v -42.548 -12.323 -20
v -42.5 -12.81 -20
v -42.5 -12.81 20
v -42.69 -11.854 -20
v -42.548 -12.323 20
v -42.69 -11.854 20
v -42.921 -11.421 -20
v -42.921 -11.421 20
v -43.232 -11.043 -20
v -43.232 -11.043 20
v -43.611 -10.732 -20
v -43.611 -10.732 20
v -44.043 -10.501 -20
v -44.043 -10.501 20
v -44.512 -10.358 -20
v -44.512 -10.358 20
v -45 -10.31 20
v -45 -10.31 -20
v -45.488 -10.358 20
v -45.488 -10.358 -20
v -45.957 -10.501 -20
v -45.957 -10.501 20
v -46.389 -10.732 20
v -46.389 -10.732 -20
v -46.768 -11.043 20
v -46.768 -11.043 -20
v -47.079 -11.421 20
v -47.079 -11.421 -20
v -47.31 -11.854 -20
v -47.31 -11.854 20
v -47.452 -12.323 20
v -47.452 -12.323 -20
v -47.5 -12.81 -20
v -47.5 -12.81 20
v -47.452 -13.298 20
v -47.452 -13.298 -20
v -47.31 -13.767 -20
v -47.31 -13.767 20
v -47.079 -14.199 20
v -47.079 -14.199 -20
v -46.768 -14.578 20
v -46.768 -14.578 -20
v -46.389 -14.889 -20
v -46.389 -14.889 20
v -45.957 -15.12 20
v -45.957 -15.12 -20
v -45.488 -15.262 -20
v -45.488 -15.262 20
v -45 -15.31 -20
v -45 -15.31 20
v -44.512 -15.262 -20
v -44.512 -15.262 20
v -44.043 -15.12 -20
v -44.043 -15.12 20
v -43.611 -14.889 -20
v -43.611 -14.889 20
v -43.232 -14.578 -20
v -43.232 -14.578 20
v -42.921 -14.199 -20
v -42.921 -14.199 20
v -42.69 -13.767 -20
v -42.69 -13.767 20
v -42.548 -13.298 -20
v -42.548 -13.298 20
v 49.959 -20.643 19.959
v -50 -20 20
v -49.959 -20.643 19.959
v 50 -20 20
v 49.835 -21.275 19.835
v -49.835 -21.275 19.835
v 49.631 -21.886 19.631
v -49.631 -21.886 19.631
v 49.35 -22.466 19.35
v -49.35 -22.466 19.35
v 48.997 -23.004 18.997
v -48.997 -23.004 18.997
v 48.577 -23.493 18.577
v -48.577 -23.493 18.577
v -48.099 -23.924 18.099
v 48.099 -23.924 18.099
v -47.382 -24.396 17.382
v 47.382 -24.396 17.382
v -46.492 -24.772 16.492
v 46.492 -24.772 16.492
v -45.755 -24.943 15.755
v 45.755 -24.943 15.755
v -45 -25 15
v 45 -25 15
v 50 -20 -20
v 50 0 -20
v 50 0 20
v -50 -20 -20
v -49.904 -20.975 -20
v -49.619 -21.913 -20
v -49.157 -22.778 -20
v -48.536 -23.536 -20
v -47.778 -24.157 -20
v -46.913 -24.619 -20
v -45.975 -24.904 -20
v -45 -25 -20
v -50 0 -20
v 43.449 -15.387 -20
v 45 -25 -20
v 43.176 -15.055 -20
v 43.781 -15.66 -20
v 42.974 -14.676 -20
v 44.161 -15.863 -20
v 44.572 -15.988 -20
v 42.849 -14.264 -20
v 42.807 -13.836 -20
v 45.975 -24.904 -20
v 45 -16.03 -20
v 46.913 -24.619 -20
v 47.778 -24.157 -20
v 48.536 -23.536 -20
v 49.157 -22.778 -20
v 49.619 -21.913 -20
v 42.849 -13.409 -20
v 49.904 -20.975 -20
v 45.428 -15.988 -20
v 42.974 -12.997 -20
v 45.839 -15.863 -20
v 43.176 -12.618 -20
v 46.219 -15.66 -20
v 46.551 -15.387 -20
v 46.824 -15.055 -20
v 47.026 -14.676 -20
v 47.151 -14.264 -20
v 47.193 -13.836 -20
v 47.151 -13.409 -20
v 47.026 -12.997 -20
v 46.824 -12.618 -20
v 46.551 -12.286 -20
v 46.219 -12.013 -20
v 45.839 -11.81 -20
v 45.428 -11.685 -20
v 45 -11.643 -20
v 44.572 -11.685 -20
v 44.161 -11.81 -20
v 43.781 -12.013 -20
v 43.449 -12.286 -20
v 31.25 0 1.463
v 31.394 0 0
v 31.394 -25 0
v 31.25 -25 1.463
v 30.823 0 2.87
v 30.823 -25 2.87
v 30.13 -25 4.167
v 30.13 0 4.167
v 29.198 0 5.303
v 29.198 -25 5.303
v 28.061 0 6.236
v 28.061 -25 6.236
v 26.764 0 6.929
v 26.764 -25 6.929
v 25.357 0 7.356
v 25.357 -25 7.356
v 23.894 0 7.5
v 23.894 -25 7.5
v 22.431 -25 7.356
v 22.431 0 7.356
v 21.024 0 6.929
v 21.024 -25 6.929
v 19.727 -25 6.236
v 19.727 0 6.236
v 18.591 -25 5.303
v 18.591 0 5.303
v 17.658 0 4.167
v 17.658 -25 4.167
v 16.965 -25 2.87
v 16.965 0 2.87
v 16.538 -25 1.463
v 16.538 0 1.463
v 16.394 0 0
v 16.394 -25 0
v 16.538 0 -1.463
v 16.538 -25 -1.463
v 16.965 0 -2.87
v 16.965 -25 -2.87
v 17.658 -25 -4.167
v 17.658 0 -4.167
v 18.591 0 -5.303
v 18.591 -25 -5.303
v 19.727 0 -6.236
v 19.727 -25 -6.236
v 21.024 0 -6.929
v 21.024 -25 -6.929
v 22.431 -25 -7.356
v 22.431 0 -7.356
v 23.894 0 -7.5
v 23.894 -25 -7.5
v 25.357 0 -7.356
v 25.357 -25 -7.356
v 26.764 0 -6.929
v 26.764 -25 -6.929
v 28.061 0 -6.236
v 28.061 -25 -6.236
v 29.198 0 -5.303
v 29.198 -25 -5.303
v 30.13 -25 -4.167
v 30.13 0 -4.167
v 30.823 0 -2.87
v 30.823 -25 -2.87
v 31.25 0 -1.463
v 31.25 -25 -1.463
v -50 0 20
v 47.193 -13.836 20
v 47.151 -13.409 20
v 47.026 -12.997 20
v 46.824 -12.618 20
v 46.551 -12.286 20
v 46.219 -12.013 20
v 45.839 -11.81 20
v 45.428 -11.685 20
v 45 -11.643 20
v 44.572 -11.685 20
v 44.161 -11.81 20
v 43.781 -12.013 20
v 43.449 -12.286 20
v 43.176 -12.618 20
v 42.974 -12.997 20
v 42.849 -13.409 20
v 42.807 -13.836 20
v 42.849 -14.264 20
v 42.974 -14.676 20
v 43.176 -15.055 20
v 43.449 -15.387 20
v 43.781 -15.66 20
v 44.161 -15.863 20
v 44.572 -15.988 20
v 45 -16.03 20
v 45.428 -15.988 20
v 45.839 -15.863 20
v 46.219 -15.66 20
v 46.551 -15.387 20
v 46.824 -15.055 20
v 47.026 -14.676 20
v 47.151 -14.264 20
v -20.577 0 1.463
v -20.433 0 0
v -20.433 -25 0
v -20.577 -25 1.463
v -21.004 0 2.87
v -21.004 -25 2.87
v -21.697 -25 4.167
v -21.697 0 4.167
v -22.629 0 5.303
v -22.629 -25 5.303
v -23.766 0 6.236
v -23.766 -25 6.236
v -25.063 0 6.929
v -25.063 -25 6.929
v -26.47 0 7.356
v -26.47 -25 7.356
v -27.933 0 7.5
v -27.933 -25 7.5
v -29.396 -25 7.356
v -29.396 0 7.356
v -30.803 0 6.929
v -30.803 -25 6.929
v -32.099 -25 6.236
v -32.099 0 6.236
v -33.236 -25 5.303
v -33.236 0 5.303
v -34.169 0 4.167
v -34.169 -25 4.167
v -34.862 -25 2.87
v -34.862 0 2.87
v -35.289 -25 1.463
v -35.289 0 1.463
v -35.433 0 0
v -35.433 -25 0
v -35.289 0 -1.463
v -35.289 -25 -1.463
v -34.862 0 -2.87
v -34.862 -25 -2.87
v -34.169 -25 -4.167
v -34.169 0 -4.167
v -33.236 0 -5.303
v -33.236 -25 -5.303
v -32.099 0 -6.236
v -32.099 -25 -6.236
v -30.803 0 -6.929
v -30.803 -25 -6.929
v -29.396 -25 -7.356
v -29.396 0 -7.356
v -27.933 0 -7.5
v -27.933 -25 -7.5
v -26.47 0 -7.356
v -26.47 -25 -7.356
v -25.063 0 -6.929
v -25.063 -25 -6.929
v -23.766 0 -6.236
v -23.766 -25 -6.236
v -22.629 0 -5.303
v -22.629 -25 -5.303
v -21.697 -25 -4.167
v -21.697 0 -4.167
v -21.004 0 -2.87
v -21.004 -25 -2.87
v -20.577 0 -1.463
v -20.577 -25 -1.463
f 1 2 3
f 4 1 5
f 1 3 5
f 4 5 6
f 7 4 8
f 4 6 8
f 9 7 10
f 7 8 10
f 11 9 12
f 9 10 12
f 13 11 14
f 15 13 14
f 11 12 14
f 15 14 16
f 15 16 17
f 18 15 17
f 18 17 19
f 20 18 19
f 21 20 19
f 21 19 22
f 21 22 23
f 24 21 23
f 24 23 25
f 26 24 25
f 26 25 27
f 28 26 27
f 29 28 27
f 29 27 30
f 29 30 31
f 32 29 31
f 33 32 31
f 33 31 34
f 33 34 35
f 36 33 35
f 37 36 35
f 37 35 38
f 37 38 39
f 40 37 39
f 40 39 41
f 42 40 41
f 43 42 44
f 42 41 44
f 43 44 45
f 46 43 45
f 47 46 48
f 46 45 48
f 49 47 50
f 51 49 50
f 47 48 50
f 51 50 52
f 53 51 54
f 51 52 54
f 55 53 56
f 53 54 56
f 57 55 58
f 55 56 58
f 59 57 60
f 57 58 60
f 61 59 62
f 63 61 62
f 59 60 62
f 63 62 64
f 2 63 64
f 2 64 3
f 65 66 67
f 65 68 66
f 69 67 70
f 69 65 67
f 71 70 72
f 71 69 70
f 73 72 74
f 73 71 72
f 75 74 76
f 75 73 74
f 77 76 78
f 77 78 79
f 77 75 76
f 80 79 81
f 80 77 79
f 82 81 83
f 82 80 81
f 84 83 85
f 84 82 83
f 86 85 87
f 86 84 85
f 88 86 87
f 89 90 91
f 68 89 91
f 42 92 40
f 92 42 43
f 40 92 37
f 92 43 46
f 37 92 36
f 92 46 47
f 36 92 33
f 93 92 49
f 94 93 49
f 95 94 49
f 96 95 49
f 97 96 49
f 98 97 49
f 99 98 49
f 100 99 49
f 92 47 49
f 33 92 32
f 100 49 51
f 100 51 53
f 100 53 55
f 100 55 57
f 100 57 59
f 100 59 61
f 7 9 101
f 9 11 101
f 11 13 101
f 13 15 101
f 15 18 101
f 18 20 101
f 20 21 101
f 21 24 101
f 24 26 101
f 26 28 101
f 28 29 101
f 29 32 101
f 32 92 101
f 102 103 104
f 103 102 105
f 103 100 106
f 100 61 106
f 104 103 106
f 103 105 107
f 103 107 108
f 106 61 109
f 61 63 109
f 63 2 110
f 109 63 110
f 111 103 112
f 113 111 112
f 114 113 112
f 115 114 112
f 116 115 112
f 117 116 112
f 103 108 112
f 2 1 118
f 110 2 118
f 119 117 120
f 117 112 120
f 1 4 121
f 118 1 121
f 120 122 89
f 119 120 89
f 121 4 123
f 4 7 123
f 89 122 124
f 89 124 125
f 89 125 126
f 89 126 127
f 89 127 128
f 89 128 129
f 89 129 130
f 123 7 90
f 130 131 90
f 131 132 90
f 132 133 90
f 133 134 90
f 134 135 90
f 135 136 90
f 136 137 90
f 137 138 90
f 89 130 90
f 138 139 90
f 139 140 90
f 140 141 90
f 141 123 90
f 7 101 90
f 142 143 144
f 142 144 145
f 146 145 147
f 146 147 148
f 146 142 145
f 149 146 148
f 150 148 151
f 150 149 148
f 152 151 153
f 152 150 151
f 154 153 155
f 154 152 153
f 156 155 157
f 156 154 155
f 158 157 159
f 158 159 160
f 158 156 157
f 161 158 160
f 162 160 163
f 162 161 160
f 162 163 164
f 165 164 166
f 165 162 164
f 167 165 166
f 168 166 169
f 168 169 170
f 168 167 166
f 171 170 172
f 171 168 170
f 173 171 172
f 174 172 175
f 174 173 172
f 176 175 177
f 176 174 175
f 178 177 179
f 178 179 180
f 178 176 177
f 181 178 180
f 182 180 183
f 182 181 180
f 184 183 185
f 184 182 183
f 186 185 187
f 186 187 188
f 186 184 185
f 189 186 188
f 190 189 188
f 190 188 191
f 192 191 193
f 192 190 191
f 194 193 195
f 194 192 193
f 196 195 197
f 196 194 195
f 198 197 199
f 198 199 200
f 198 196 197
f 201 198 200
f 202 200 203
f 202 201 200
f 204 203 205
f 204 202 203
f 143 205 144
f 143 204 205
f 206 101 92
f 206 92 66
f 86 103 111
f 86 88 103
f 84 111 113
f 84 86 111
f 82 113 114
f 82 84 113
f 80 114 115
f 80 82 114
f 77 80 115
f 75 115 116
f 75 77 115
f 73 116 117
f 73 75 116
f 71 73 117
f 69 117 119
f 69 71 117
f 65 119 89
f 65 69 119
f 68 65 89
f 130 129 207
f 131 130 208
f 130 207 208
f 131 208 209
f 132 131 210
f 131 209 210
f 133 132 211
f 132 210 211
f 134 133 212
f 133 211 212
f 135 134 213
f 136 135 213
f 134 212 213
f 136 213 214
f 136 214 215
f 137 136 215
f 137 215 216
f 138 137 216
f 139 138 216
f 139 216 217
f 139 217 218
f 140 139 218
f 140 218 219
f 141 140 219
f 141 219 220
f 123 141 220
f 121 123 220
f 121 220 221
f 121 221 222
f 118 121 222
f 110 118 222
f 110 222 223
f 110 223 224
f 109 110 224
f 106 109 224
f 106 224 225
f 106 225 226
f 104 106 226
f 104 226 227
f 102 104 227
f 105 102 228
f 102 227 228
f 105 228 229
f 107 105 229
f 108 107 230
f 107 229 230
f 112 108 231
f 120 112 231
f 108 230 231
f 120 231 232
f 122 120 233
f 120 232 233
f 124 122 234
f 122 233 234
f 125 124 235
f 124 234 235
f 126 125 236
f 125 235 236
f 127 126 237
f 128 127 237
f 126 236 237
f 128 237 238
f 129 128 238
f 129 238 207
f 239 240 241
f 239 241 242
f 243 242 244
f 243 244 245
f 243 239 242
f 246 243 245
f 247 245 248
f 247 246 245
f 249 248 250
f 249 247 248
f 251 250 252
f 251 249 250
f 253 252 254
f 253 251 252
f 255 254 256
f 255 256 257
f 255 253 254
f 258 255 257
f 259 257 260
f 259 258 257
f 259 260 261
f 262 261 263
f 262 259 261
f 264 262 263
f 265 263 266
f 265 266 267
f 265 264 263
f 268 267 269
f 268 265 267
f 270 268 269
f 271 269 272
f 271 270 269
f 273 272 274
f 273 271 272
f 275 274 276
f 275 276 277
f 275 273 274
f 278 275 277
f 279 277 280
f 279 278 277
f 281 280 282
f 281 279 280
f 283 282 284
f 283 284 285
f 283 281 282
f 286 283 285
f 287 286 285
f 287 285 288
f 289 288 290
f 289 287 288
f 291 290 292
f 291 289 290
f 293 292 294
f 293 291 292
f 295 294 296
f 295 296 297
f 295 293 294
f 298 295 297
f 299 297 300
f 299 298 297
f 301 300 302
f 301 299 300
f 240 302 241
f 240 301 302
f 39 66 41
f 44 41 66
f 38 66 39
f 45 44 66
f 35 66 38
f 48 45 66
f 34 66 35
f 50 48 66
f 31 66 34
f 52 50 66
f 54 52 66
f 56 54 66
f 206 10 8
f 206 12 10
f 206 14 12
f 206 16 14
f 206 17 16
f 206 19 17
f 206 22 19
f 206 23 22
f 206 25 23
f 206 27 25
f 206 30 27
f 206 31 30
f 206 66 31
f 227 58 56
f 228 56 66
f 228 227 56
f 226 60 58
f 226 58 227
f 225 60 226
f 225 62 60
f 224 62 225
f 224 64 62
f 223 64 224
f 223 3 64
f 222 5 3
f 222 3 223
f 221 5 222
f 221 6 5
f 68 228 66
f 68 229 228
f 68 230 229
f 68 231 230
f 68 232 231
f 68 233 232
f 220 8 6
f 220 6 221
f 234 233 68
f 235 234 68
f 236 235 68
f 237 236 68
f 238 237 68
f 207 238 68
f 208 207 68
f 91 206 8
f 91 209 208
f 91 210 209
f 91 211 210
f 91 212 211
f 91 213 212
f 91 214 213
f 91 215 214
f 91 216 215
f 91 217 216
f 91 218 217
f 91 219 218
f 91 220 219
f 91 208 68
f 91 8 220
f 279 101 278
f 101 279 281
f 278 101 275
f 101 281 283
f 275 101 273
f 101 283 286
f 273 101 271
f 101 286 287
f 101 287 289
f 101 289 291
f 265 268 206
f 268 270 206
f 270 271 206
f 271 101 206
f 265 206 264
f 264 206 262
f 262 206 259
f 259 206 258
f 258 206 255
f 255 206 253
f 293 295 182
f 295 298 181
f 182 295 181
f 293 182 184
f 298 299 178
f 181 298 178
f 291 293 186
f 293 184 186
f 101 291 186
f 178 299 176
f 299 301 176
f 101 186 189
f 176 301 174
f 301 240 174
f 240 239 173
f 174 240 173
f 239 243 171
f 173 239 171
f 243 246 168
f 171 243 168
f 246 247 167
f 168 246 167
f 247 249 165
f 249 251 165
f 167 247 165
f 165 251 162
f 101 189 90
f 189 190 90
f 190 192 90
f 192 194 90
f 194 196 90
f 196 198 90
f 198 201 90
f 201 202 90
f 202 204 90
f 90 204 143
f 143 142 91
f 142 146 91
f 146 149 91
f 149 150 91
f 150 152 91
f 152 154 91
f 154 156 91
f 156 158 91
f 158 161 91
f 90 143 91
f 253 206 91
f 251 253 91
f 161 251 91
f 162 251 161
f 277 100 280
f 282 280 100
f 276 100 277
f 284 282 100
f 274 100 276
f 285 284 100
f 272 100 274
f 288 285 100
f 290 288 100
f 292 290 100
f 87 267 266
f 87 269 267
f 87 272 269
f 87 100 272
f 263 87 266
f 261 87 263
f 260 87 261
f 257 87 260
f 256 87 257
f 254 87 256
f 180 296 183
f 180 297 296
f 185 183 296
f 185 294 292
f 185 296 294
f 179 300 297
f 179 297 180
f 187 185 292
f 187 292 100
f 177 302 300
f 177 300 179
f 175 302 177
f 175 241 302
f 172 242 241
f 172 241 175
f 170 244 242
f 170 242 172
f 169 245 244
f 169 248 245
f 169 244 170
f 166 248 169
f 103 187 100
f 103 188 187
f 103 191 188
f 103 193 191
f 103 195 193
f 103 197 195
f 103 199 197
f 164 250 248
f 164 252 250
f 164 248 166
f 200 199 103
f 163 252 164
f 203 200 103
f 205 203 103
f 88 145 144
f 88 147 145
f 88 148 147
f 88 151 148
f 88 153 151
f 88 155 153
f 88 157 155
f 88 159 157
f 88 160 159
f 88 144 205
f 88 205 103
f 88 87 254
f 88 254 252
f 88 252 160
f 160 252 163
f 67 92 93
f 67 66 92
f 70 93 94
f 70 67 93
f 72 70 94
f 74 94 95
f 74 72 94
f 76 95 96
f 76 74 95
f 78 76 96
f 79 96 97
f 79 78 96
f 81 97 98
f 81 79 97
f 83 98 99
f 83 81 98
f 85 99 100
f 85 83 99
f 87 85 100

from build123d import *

# Parameters (mm, degrees)
F0_W     = 100
F0_H     = 40
F0_R     = 7.5
F1_DEPTH = 25
F2_R     = 2.5
F2_R_2   = 2.193335
F3_DEPTH = 40.001
F4_R     = 5


with BuildPart() as f1:
    # F0 (on Front) → F1 (new body)
    with BuildSketch(Plane.XZ):
        Rectangle(F0_W, F0_H)
        with Locations((-27.932694, 0)):
            Circle(F0_R, mode=Mode.SUBTRACT)
        with Locations((23.894234, 0)):
            Circle(F0_R, mode=Mode.SUBTRACT)
    extrude(amount=F1_DEPTH)

    # F2 (on face) → F3 (cut, through all)
    with BuildSketch(Plane.XY.offset(20)):
        with Locations((-45, -12.810267)):
            Circle(F2_R)
        with Locations((45, -13.836424)):
            Circle(F2_R_2)
    extrude(amount=-F3_DEPTH, mode=Mode.SUBTRACT)

    # F4
    f4_edges = [f1.edges().sort_by_distance(p)[0] for p in [
        (-50, -25, 0),
        (0, -25, 20),
        (50, -25, 0),
    ]]
    fillet(f4_edges, radius=F4_R)


solid = f1.part
